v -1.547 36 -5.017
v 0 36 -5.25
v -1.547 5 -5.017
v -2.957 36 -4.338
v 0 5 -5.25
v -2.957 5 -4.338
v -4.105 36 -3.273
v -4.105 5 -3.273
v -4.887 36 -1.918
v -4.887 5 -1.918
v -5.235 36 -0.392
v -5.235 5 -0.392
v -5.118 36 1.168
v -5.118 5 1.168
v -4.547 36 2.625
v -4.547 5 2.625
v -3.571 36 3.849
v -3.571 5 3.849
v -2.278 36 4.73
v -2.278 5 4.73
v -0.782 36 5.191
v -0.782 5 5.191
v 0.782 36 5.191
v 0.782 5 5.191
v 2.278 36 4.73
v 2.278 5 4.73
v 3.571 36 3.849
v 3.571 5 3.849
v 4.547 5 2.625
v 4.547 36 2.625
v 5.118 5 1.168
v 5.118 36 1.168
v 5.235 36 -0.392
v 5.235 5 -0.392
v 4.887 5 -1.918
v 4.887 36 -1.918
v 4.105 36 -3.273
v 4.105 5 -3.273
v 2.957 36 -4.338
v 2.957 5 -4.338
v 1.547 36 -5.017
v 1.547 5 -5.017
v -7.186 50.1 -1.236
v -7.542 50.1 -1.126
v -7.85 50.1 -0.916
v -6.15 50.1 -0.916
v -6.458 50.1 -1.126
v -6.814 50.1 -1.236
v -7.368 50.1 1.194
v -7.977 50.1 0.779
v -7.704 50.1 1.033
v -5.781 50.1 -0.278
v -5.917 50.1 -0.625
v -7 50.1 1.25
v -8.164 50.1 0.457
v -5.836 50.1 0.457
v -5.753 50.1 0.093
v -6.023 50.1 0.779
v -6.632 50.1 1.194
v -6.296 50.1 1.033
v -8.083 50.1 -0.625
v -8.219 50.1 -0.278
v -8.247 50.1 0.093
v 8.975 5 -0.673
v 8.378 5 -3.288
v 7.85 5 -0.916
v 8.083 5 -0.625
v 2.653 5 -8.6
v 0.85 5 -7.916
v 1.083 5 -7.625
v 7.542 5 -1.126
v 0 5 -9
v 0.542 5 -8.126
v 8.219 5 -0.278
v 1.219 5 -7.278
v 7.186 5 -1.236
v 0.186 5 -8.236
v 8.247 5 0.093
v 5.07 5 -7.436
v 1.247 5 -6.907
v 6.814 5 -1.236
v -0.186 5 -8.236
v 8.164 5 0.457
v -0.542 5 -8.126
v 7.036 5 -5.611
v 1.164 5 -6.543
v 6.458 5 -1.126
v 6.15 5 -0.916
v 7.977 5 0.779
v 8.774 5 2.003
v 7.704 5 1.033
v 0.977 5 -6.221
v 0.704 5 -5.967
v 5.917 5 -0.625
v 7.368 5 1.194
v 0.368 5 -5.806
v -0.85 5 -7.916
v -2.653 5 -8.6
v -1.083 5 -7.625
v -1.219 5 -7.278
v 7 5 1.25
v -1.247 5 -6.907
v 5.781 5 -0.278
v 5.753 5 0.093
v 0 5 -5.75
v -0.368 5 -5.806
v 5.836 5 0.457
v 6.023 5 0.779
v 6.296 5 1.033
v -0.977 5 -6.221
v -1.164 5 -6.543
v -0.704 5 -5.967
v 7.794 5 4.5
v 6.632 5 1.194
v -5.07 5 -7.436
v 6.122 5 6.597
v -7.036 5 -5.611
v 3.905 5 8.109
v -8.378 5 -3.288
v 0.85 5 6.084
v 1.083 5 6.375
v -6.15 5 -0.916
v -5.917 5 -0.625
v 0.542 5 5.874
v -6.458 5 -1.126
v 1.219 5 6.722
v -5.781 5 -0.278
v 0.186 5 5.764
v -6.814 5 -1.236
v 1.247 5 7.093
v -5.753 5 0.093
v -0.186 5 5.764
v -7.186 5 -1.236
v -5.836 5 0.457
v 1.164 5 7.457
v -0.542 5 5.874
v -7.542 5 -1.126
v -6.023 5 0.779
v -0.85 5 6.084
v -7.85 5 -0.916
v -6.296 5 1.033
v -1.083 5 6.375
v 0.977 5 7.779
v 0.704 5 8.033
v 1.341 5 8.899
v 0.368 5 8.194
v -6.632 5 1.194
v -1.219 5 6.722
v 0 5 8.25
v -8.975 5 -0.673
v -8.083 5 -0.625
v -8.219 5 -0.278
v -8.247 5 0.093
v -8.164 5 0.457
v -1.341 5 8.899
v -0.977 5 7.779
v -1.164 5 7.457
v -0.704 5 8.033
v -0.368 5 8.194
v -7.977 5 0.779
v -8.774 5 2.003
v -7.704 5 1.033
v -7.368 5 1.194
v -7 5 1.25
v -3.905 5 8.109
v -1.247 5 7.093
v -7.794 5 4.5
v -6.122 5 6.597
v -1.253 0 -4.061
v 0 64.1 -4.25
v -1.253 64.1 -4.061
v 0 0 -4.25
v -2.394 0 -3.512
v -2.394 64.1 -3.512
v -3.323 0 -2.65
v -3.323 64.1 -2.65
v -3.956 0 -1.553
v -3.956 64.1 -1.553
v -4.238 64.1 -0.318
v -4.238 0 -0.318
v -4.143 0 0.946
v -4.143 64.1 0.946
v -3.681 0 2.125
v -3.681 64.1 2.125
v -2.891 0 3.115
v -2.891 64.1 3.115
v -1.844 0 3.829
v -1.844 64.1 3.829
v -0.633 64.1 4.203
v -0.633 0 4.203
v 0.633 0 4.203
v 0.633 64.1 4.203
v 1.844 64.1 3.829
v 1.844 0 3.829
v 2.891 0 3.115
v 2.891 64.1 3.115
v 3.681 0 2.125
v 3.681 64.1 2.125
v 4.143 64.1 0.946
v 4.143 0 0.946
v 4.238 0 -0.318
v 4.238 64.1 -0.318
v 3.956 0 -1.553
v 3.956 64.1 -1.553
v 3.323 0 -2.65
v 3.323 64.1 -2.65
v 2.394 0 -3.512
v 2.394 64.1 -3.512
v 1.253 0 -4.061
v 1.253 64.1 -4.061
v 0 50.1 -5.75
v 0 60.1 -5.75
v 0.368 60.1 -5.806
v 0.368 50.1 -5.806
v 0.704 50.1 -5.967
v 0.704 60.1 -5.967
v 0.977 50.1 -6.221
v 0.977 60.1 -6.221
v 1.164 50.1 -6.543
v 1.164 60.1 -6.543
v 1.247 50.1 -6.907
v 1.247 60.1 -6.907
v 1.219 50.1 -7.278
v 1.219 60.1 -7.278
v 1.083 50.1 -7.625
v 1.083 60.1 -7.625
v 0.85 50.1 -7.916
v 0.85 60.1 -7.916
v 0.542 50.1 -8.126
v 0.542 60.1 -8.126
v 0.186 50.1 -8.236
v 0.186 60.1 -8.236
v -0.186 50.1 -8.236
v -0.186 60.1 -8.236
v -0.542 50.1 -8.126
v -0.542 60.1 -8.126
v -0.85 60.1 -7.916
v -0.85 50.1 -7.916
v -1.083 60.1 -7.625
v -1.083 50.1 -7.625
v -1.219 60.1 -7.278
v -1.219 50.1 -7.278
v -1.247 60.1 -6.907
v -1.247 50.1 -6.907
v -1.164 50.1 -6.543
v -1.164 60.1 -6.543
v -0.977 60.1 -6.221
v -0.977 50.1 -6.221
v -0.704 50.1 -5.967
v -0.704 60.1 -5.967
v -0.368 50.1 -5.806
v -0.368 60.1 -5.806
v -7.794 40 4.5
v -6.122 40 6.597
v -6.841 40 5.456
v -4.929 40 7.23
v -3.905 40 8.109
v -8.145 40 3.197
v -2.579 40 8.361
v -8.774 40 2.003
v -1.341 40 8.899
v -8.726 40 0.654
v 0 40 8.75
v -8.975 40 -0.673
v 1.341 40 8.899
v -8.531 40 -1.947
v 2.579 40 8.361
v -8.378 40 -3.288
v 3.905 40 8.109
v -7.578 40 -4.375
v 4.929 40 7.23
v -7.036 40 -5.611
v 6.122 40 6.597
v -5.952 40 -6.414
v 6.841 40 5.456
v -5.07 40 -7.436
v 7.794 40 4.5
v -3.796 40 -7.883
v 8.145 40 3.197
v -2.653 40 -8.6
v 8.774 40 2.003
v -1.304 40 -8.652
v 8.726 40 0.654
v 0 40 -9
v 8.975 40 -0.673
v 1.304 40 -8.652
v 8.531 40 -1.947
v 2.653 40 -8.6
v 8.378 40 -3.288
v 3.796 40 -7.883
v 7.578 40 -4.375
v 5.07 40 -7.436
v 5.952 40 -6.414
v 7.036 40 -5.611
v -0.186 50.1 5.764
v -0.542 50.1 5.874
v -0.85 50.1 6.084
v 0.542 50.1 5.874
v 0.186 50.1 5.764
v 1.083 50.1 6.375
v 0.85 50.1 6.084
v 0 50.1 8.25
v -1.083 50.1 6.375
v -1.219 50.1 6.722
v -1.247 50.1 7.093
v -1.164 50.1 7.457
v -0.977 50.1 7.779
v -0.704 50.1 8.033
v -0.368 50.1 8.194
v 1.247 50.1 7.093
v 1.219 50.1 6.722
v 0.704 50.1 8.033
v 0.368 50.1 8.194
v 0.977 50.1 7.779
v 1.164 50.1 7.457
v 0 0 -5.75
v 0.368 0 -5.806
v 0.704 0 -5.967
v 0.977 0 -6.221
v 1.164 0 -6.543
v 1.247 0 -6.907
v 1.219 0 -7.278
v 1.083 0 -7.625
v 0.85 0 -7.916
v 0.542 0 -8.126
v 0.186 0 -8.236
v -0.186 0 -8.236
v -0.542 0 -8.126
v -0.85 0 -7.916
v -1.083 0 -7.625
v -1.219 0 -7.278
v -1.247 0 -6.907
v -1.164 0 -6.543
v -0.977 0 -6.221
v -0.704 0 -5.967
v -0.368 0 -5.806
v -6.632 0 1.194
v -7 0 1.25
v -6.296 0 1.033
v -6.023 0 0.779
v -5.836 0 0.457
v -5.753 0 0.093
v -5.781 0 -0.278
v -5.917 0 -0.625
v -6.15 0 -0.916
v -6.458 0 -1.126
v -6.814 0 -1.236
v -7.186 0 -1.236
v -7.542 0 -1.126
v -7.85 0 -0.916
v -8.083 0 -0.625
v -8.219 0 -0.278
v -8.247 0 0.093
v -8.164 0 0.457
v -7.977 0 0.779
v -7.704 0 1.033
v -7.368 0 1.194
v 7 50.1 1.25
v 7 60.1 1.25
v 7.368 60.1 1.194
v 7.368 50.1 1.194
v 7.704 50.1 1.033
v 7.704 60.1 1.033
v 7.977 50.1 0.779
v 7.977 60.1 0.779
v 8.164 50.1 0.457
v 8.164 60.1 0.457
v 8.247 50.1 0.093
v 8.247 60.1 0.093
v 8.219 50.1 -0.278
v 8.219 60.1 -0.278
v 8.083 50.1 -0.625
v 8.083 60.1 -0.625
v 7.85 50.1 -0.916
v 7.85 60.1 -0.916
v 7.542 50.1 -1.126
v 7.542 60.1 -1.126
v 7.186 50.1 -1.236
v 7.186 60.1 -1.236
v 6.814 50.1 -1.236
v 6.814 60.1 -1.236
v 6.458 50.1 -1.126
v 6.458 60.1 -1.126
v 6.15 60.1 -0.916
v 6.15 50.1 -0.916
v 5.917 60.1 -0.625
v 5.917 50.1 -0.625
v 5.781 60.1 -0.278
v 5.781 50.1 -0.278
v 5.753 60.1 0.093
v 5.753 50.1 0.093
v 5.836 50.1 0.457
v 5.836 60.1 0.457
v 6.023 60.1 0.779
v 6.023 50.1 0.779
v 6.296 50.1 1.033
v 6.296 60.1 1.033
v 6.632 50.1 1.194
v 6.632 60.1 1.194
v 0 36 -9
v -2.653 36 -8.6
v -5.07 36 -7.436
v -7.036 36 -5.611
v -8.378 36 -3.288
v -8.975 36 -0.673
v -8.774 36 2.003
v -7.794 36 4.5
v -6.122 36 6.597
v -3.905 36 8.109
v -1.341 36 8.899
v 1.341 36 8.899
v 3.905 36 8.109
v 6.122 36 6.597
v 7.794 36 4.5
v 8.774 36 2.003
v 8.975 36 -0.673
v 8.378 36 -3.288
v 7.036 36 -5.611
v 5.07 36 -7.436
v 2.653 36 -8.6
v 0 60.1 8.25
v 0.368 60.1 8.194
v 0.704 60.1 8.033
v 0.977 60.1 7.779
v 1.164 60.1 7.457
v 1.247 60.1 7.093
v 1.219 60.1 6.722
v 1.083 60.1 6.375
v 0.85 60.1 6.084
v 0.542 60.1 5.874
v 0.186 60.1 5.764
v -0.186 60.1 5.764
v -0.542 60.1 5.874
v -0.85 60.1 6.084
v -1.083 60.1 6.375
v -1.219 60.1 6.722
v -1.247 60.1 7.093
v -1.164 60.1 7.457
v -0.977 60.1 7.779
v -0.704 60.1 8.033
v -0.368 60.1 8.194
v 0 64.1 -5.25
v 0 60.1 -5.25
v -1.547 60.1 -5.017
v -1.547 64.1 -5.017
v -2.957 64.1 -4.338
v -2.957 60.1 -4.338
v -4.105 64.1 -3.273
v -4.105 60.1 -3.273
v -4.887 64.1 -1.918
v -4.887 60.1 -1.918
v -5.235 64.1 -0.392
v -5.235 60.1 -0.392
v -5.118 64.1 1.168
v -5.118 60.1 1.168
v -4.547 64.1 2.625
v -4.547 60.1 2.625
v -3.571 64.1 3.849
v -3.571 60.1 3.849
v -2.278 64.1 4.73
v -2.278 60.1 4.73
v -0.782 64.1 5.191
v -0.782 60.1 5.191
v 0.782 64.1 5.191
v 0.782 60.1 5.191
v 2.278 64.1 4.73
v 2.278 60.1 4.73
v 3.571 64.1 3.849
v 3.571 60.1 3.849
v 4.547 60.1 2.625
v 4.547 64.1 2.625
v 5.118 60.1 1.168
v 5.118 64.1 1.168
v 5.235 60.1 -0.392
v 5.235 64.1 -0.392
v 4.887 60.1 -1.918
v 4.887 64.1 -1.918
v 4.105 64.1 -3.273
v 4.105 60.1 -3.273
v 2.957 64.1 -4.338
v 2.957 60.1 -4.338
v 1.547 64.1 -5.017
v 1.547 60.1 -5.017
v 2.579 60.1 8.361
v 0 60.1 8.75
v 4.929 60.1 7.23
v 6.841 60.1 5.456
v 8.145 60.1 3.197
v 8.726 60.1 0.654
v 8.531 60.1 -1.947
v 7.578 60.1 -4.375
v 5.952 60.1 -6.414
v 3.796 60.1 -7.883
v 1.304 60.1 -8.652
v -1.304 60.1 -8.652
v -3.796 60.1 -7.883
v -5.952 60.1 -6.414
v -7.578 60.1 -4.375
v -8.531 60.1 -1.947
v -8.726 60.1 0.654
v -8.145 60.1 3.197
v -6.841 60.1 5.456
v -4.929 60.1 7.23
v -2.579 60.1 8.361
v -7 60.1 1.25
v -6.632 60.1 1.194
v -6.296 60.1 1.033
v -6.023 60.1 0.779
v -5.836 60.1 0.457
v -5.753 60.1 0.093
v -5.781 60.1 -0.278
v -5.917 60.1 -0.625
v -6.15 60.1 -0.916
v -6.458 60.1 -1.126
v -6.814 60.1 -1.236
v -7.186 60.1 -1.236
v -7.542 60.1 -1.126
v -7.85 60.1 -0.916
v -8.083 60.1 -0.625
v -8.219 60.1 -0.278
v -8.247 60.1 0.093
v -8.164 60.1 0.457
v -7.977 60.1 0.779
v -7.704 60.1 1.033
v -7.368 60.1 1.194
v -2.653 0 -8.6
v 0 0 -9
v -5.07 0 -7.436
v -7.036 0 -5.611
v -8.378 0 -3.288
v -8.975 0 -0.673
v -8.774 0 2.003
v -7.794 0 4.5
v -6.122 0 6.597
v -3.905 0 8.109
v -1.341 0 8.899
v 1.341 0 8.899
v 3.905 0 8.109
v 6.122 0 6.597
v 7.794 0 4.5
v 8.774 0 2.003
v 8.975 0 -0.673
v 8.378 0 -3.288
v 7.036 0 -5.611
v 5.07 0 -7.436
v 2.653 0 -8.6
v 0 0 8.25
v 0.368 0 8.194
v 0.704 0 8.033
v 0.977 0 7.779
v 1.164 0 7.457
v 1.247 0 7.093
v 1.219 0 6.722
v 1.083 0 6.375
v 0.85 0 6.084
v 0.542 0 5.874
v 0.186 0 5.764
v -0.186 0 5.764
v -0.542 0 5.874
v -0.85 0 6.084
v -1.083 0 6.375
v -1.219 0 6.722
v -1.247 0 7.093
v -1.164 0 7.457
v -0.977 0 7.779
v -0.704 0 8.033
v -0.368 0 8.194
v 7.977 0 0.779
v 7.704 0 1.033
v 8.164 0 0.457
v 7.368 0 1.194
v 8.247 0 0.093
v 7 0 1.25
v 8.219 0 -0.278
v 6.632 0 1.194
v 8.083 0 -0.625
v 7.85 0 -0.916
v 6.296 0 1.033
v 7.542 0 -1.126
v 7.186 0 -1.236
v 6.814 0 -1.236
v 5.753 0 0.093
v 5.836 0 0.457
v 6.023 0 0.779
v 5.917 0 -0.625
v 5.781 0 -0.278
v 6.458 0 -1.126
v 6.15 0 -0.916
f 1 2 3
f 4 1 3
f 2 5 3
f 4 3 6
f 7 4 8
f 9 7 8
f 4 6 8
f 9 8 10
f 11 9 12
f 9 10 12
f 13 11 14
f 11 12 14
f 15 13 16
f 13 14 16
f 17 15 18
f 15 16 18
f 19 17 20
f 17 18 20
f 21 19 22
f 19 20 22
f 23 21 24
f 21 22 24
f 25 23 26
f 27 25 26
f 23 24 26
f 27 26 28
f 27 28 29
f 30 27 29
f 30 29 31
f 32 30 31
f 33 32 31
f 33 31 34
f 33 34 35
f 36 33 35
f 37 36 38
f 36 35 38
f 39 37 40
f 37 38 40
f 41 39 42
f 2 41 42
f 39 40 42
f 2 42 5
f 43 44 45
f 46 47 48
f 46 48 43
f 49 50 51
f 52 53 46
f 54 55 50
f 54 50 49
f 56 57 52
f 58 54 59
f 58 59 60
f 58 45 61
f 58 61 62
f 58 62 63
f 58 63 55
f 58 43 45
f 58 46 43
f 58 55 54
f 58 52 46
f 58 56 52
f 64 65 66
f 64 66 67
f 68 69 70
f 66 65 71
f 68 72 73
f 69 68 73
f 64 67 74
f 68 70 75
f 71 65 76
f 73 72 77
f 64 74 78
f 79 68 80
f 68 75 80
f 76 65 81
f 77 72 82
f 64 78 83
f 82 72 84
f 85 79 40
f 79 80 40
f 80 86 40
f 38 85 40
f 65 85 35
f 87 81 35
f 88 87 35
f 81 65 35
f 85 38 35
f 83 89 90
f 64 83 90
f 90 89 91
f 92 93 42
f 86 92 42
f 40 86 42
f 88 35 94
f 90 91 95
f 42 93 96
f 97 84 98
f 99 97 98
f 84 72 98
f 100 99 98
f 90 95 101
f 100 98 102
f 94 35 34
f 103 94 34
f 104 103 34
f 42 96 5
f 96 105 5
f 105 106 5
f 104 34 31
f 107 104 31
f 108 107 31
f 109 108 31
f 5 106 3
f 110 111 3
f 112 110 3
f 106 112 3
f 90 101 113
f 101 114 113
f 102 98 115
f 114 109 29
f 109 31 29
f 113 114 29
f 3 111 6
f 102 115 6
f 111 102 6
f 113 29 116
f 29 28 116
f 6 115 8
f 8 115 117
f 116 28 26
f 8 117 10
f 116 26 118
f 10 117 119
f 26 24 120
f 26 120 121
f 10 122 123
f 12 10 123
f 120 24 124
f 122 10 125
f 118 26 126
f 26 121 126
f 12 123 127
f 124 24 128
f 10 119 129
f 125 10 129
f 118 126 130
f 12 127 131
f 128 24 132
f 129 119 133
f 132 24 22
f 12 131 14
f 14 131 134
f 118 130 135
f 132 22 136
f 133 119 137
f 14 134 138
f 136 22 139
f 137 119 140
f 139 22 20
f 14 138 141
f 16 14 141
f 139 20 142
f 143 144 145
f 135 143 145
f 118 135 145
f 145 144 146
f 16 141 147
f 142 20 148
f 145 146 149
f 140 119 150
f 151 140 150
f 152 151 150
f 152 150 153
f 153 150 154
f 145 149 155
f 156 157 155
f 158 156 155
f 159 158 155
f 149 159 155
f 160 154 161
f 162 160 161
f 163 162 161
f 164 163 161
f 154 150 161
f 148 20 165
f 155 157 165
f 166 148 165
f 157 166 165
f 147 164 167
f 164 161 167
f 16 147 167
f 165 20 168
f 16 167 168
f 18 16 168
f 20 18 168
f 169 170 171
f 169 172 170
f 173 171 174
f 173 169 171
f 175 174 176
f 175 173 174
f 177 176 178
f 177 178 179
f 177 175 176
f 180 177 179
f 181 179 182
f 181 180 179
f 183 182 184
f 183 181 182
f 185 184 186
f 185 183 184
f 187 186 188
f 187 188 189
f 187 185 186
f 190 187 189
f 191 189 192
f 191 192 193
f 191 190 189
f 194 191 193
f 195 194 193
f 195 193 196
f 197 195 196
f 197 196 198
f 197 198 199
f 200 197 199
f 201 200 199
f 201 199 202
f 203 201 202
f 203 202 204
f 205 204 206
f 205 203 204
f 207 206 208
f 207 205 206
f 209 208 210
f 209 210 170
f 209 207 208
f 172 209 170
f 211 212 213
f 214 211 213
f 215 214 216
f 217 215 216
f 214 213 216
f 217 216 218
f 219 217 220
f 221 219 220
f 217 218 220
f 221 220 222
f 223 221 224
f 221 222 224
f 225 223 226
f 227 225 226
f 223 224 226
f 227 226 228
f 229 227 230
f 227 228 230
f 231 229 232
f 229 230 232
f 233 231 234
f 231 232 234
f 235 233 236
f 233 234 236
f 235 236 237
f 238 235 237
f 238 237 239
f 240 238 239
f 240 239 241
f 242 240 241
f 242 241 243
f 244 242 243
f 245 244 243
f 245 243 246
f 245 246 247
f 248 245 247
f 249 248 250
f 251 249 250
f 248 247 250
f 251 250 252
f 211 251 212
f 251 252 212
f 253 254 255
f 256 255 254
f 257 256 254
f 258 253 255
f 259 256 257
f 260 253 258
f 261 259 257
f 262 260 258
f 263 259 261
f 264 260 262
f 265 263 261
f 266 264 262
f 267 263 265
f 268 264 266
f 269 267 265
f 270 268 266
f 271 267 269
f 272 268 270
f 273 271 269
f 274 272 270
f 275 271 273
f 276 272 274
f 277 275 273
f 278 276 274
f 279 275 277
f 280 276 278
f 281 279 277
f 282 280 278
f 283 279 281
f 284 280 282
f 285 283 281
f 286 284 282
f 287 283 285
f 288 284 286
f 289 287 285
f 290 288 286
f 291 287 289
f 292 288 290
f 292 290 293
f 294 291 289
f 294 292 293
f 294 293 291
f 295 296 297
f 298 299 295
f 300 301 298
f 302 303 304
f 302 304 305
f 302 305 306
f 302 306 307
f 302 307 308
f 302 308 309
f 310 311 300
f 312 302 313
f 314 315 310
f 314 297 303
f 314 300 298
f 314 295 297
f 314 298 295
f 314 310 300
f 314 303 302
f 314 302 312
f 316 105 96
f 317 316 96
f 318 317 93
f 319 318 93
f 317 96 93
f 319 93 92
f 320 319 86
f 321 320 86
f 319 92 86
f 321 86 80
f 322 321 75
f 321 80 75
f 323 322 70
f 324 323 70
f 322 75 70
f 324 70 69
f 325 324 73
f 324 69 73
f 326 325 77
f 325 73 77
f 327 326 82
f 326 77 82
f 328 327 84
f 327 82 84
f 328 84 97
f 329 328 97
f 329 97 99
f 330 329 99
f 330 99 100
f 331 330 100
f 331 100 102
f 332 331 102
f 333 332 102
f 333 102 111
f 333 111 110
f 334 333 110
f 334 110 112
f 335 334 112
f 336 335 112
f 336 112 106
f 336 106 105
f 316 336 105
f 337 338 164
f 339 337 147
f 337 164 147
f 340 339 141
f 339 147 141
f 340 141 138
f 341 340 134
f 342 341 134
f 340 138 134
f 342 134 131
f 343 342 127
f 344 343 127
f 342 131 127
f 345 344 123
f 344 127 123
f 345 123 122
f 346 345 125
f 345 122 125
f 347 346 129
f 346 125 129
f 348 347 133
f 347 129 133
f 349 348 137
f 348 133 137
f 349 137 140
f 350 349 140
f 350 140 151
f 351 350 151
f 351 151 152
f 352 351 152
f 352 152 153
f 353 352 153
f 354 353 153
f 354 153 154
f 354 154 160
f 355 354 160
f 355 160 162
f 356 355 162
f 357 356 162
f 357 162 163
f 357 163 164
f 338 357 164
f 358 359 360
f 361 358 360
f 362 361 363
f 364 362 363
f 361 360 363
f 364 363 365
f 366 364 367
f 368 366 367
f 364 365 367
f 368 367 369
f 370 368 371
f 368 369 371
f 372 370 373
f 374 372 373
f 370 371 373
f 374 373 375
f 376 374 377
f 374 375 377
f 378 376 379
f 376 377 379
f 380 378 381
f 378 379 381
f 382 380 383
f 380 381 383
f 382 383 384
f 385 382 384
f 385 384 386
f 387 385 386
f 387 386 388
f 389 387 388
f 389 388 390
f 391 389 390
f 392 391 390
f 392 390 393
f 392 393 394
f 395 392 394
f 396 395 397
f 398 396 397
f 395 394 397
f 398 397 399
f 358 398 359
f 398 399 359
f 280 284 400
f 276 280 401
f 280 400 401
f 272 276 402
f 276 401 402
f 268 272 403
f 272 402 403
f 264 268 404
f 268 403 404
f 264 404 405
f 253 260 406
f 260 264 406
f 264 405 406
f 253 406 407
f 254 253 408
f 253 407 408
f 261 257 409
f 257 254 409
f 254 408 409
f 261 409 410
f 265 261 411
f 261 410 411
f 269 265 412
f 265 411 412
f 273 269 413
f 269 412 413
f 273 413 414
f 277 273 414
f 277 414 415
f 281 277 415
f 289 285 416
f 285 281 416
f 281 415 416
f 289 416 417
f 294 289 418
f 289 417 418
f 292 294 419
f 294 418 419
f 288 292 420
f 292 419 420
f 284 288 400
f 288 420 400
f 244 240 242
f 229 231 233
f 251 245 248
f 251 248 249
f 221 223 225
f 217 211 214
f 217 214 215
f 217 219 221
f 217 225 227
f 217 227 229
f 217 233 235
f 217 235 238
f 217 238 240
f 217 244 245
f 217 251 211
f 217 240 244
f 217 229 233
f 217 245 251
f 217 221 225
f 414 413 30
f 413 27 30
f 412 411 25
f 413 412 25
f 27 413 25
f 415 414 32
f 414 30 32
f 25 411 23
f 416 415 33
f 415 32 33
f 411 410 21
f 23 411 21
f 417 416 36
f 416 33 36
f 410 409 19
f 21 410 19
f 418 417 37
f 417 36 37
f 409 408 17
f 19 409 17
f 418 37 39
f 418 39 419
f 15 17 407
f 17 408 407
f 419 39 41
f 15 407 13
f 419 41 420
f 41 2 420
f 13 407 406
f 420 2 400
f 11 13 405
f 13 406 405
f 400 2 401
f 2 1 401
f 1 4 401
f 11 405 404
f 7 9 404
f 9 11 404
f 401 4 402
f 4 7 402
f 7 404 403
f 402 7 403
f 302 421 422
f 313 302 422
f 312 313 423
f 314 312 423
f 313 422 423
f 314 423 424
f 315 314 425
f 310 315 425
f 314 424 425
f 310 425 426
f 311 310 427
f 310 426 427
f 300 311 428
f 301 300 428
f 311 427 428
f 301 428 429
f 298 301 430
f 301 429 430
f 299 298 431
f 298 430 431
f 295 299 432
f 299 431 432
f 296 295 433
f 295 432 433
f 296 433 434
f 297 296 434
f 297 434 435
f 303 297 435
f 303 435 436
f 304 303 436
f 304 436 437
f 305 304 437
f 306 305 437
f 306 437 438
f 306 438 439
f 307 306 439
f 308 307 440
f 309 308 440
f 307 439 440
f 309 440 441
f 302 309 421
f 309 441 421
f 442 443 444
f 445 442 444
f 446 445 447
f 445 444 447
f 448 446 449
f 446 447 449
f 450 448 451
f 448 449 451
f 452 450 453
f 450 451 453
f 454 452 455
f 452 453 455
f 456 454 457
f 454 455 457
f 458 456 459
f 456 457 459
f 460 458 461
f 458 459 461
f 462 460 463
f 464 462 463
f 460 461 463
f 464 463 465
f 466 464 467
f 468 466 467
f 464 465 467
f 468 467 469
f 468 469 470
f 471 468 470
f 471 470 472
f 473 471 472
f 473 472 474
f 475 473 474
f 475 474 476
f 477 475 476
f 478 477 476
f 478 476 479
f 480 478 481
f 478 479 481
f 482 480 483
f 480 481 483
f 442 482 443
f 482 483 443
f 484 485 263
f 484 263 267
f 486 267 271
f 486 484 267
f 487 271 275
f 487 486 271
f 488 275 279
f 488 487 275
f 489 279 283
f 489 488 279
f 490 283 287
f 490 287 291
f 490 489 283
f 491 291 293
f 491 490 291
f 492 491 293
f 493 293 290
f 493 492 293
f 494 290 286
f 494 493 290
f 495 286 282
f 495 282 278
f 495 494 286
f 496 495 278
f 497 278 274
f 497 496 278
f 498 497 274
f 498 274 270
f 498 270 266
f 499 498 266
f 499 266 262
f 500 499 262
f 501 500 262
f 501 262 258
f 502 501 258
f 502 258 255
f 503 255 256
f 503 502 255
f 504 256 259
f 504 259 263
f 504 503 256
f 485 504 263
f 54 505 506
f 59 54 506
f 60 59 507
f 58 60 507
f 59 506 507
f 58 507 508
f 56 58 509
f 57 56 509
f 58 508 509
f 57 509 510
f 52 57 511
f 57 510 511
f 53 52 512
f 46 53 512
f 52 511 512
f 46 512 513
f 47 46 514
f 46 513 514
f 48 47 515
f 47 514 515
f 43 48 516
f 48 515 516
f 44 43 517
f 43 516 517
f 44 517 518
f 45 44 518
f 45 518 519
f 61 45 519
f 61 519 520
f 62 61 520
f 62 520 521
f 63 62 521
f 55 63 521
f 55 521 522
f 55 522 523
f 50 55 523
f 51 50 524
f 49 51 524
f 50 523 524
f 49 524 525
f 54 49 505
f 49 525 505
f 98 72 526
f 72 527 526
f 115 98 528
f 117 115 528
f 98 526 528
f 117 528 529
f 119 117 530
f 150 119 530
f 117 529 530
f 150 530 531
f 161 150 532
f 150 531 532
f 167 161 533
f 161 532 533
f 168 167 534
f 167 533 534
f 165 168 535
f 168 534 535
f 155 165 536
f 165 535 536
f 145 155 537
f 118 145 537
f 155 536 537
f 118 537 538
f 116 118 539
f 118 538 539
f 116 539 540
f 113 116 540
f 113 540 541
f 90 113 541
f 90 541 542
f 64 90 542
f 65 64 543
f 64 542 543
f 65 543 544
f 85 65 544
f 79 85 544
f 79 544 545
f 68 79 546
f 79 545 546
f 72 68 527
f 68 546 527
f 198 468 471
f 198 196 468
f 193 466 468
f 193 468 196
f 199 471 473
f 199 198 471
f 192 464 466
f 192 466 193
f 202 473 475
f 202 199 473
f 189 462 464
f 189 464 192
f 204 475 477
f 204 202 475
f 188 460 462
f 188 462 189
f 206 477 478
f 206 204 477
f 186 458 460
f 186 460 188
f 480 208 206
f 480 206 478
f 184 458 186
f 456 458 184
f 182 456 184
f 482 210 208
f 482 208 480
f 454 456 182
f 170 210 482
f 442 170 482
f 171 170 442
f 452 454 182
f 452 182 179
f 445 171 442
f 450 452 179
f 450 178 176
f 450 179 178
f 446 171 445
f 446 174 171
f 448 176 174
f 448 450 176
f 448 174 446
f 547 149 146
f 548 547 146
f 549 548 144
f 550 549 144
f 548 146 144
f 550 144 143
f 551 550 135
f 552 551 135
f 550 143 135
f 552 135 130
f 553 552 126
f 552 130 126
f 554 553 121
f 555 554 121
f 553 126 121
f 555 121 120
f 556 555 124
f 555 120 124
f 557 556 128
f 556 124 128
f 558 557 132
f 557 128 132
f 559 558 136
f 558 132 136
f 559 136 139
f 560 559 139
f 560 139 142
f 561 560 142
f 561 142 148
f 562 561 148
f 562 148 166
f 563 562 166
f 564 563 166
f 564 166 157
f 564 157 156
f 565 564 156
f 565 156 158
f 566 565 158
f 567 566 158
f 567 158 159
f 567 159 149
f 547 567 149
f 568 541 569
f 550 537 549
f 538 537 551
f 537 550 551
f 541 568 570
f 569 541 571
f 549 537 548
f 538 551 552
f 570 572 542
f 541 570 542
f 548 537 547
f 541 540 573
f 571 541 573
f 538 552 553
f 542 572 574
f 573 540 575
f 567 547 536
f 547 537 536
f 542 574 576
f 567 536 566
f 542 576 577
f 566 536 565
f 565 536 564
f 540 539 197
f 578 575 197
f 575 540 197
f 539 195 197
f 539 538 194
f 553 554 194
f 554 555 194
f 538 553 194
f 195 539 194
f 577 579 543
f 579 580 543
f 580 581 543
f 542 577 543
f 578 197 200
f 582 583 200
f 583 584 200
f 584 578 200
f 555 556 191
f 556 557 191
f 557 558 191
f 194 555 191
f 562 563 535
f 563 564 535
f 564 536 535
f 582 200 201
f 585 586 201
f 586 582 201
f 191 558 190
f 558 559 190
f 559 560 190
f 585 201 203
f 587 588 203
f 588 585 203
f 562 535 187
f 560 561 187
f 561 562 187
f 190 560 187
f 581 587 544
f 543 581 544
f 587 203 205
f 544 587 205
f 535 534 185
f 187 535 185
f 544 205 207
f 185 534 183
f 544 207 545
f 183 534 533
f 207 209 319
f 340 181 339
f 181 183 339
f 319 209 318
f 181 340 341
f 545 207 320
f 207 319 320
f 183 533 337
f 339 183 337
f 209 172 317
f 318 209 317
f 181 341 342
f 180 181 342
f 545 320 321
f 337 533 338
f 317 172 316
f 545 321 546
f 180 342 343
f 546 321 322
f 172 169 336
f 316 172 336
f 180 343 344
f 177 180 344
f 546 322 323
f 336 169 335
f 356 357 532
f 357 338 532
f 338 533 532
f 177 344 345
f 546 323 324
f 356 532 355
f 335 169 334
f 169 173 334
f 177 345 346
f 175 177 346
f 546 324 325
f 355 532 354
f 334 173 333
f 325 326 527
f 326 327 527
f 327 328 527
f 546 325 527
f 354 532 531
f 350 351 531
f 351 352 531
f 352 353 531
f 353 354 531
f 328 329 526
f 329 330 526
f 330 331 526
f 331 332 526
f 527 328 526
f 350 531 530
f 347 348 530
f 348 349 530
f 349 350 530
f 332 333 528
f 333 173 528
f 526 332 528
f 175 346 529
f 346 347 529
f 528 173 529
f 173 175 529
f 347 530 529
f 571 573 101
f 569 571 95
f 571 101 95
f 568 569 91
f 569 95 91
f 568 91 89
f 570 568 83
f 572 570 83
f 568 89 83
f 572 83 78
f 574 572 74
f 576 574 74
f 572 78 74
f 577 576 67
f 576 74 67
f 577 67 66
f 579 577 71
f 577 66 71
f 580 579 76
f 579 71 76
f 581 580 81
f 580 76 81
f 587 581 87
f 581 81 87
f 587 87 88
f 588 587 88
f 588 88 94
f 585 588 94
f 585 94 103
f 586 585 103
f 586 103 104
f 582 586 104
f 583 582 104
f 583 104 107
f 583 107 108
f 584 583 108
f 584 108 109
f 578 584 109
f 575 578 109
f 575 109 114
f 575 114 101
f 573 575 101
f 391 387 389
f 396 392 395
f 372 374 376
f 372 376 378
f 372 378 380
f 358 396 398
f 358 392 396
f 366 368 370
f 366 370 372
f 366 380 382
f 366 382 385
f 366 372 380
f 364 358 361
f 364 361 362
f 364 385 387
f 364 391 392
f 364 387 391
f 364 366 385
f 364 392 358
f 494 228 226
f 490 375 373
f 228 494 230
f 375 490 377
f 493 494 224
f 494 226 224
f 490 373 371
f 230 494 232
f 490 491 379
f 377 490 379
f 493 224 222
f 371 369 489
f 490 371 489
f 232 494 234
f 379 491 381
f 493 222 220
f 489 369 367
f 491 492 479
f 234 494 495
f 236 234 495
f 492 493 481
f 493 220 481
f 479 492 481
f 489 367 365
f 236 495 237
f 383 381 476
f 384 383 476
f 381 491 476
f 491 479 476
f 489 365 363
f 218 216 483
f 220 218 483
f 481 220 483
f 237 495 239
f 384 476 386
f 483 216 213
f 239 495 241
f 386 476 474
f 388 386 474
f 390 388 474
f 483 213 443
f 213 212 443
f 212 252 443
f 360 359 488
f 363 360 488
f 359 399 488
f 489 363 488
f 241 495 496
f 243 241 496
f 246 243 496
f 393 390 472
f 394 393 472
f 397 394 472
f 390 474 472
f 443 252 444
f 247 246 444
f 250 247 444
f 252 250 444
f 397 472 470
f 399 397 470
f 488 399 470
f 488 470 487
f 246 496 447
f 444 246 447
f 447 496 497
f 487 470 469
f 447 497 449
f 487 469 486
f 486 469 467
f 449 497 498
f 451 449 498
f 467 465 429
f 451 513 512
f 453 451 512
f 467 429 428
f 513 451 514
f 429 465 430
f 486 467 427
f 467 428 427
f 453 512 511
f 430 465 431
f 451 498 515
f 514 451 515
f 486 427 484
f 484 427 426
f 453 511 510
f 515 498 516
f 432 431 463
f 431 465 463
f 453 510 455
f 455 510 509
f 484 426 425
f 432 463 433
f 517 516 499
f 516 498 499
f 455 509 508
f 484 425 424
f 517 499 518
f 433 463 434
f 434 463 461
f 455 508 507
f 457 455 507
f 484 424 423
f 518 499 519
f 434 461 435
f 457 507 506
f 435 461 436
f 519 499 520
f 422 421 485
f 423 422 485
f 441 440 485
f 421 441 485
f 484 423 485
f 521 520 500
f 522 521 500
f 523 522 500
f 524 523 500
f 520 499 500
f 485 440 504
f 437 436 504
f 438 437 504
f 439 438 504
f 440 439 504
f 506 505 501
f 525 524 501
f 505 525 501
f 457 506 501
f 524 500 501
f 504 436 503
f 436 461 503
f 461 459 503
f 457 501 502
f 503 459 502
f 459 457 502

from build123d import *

# Parameters (mm, degrees)
SKETCH_2_R          = 1.25
CUT_EXTRUDE_1_DEPTH = 10
CUT_EXTRUDE_START   = -54.1
SKETCH_2_2_R        = 1.25
CUT_EXTRUDE_2_DEPTH = 6
SKETCH_3_OUTSIDE_W  = 33.054
SKETCH_3_OUTSIDE_H  = 33.054
SKETCH_3_OUTSIDE_R  = 8.75
CUT_EXTRUDE_3_DEPTH = 20.1
SKETCH_4_R          = 5.25
SKETCH_4_R_2        = 4.25
EXTRUDE_1_DEPTH     = 4


with BuildPart() as part:
    # 草图1 → 旋转1 (revolve)
    with BuildSketch(Plane.XY, mode=Mode.PRIVATE) as revolve_1_sk:
        Polygon((-9, 36), (-5.25, 36), (-5.25, 5), (-9, 5), (-9, 0), (-4.25, 0), (-4.25, 60.1), (-9, 60.1), align=None)
    revolve(revolve_1_sk.sketch.rotate(Axis((0, 0, 0), (0, 1, 0)), 270), axis=Axis((0, 0, 0), (0, 1, 0)))

    # 草图2 → 切除-拉伸1 (cut)
    with BuildSketch(Plane(origin=(0, 60.1, 0), x_dir=(1, 0, 0), z_dir=(0, 1, 0))):
        with Locations(Location((0, 7, 0), (0, 0, 270))):
            Circle(SKETCH_2_R)
        with Locations(Location((0, -7, 0), (0, 0, 270))):
            Circle(SKETCH_2_R)
        with Locations(Location((-7, 0, 0), (0, 0, 270))):
            Circle(SKETCH_2_R)
        with Locations(Location((7, 0, 0), (0, 0, 270))):
            Circle(SKETCH_2_R)
    extrude(amount=-CUT_EXTRUDE_1_DEPTH, mode=Mode.SUBTRACT)

    # 草图2<2> → 切除-拉伸2 (cut)
    with BuildSketch(Plane(origin=(0, 60.1, 0), x_dir=(1, 0, 0), z_dir=(0, 1, 0)).offset(CUT_EXTRUDE_START)):
        with Locations(Location((0, 7, 0), (0, 0, 270))):
            Circle(SKETCH_2_2_R)
        with Locations(Location((0, -7, 0), (0, 0, 270))):
            Circle(SKETCH_2_2_R)
        with Locations(Location((-7, 0, 0), (0, 0, 270))):
            Circle(SKETCH_2_2_R)
        with Locations(Location((7, 0, 0), (0, 0, 270))):
            Circle(SKETCH_2_2_R)
    extrude(amount=-CUT_EXTRUDE_2_DEPTH, mode=Mode.SUBTRACT)

    # 草图3 outside → 切除-拉伸3 (cut)
    with BuildSketch(Plane(origin=(0, 60.1, 0), x_dir=(1, 0, 0), z_dir=(0, 1, 0))):
        Rectangle(SKETCH_3_OUTSIDE_W, SKETCH_3_OUTSIDE_H)
        with Locations(Location((0, 0, 0), (0, 0, 270))):
            Circle(SKETCH_3_OUTSIDE_R, mode=Mode.SUBTRACT)
    extrude(amount=-CUT_EXTRUDE_3_DEPTH, mode=Mode.SUBTRACT)

    # 草图4 → 凸台-拉伸1 (add)
    with BuildSketch(Plane(origin=(0, 60.1, 0), x_dir=(1, 0, 0), z_dir=(0, 1, 0))):
        with Locations(Location((0, 0, 0), (0, 0, 90))):
            Circle(SKETCH_4_R)
        with Locations(Location((0, 0, 0), (0, 0, 90))):
            Circle(SKETCH_4_R_2, mode=Mode.SUBTRACT)
    extrude(amount=EXTRUDE_1_DEPTH)


solid = part.part
